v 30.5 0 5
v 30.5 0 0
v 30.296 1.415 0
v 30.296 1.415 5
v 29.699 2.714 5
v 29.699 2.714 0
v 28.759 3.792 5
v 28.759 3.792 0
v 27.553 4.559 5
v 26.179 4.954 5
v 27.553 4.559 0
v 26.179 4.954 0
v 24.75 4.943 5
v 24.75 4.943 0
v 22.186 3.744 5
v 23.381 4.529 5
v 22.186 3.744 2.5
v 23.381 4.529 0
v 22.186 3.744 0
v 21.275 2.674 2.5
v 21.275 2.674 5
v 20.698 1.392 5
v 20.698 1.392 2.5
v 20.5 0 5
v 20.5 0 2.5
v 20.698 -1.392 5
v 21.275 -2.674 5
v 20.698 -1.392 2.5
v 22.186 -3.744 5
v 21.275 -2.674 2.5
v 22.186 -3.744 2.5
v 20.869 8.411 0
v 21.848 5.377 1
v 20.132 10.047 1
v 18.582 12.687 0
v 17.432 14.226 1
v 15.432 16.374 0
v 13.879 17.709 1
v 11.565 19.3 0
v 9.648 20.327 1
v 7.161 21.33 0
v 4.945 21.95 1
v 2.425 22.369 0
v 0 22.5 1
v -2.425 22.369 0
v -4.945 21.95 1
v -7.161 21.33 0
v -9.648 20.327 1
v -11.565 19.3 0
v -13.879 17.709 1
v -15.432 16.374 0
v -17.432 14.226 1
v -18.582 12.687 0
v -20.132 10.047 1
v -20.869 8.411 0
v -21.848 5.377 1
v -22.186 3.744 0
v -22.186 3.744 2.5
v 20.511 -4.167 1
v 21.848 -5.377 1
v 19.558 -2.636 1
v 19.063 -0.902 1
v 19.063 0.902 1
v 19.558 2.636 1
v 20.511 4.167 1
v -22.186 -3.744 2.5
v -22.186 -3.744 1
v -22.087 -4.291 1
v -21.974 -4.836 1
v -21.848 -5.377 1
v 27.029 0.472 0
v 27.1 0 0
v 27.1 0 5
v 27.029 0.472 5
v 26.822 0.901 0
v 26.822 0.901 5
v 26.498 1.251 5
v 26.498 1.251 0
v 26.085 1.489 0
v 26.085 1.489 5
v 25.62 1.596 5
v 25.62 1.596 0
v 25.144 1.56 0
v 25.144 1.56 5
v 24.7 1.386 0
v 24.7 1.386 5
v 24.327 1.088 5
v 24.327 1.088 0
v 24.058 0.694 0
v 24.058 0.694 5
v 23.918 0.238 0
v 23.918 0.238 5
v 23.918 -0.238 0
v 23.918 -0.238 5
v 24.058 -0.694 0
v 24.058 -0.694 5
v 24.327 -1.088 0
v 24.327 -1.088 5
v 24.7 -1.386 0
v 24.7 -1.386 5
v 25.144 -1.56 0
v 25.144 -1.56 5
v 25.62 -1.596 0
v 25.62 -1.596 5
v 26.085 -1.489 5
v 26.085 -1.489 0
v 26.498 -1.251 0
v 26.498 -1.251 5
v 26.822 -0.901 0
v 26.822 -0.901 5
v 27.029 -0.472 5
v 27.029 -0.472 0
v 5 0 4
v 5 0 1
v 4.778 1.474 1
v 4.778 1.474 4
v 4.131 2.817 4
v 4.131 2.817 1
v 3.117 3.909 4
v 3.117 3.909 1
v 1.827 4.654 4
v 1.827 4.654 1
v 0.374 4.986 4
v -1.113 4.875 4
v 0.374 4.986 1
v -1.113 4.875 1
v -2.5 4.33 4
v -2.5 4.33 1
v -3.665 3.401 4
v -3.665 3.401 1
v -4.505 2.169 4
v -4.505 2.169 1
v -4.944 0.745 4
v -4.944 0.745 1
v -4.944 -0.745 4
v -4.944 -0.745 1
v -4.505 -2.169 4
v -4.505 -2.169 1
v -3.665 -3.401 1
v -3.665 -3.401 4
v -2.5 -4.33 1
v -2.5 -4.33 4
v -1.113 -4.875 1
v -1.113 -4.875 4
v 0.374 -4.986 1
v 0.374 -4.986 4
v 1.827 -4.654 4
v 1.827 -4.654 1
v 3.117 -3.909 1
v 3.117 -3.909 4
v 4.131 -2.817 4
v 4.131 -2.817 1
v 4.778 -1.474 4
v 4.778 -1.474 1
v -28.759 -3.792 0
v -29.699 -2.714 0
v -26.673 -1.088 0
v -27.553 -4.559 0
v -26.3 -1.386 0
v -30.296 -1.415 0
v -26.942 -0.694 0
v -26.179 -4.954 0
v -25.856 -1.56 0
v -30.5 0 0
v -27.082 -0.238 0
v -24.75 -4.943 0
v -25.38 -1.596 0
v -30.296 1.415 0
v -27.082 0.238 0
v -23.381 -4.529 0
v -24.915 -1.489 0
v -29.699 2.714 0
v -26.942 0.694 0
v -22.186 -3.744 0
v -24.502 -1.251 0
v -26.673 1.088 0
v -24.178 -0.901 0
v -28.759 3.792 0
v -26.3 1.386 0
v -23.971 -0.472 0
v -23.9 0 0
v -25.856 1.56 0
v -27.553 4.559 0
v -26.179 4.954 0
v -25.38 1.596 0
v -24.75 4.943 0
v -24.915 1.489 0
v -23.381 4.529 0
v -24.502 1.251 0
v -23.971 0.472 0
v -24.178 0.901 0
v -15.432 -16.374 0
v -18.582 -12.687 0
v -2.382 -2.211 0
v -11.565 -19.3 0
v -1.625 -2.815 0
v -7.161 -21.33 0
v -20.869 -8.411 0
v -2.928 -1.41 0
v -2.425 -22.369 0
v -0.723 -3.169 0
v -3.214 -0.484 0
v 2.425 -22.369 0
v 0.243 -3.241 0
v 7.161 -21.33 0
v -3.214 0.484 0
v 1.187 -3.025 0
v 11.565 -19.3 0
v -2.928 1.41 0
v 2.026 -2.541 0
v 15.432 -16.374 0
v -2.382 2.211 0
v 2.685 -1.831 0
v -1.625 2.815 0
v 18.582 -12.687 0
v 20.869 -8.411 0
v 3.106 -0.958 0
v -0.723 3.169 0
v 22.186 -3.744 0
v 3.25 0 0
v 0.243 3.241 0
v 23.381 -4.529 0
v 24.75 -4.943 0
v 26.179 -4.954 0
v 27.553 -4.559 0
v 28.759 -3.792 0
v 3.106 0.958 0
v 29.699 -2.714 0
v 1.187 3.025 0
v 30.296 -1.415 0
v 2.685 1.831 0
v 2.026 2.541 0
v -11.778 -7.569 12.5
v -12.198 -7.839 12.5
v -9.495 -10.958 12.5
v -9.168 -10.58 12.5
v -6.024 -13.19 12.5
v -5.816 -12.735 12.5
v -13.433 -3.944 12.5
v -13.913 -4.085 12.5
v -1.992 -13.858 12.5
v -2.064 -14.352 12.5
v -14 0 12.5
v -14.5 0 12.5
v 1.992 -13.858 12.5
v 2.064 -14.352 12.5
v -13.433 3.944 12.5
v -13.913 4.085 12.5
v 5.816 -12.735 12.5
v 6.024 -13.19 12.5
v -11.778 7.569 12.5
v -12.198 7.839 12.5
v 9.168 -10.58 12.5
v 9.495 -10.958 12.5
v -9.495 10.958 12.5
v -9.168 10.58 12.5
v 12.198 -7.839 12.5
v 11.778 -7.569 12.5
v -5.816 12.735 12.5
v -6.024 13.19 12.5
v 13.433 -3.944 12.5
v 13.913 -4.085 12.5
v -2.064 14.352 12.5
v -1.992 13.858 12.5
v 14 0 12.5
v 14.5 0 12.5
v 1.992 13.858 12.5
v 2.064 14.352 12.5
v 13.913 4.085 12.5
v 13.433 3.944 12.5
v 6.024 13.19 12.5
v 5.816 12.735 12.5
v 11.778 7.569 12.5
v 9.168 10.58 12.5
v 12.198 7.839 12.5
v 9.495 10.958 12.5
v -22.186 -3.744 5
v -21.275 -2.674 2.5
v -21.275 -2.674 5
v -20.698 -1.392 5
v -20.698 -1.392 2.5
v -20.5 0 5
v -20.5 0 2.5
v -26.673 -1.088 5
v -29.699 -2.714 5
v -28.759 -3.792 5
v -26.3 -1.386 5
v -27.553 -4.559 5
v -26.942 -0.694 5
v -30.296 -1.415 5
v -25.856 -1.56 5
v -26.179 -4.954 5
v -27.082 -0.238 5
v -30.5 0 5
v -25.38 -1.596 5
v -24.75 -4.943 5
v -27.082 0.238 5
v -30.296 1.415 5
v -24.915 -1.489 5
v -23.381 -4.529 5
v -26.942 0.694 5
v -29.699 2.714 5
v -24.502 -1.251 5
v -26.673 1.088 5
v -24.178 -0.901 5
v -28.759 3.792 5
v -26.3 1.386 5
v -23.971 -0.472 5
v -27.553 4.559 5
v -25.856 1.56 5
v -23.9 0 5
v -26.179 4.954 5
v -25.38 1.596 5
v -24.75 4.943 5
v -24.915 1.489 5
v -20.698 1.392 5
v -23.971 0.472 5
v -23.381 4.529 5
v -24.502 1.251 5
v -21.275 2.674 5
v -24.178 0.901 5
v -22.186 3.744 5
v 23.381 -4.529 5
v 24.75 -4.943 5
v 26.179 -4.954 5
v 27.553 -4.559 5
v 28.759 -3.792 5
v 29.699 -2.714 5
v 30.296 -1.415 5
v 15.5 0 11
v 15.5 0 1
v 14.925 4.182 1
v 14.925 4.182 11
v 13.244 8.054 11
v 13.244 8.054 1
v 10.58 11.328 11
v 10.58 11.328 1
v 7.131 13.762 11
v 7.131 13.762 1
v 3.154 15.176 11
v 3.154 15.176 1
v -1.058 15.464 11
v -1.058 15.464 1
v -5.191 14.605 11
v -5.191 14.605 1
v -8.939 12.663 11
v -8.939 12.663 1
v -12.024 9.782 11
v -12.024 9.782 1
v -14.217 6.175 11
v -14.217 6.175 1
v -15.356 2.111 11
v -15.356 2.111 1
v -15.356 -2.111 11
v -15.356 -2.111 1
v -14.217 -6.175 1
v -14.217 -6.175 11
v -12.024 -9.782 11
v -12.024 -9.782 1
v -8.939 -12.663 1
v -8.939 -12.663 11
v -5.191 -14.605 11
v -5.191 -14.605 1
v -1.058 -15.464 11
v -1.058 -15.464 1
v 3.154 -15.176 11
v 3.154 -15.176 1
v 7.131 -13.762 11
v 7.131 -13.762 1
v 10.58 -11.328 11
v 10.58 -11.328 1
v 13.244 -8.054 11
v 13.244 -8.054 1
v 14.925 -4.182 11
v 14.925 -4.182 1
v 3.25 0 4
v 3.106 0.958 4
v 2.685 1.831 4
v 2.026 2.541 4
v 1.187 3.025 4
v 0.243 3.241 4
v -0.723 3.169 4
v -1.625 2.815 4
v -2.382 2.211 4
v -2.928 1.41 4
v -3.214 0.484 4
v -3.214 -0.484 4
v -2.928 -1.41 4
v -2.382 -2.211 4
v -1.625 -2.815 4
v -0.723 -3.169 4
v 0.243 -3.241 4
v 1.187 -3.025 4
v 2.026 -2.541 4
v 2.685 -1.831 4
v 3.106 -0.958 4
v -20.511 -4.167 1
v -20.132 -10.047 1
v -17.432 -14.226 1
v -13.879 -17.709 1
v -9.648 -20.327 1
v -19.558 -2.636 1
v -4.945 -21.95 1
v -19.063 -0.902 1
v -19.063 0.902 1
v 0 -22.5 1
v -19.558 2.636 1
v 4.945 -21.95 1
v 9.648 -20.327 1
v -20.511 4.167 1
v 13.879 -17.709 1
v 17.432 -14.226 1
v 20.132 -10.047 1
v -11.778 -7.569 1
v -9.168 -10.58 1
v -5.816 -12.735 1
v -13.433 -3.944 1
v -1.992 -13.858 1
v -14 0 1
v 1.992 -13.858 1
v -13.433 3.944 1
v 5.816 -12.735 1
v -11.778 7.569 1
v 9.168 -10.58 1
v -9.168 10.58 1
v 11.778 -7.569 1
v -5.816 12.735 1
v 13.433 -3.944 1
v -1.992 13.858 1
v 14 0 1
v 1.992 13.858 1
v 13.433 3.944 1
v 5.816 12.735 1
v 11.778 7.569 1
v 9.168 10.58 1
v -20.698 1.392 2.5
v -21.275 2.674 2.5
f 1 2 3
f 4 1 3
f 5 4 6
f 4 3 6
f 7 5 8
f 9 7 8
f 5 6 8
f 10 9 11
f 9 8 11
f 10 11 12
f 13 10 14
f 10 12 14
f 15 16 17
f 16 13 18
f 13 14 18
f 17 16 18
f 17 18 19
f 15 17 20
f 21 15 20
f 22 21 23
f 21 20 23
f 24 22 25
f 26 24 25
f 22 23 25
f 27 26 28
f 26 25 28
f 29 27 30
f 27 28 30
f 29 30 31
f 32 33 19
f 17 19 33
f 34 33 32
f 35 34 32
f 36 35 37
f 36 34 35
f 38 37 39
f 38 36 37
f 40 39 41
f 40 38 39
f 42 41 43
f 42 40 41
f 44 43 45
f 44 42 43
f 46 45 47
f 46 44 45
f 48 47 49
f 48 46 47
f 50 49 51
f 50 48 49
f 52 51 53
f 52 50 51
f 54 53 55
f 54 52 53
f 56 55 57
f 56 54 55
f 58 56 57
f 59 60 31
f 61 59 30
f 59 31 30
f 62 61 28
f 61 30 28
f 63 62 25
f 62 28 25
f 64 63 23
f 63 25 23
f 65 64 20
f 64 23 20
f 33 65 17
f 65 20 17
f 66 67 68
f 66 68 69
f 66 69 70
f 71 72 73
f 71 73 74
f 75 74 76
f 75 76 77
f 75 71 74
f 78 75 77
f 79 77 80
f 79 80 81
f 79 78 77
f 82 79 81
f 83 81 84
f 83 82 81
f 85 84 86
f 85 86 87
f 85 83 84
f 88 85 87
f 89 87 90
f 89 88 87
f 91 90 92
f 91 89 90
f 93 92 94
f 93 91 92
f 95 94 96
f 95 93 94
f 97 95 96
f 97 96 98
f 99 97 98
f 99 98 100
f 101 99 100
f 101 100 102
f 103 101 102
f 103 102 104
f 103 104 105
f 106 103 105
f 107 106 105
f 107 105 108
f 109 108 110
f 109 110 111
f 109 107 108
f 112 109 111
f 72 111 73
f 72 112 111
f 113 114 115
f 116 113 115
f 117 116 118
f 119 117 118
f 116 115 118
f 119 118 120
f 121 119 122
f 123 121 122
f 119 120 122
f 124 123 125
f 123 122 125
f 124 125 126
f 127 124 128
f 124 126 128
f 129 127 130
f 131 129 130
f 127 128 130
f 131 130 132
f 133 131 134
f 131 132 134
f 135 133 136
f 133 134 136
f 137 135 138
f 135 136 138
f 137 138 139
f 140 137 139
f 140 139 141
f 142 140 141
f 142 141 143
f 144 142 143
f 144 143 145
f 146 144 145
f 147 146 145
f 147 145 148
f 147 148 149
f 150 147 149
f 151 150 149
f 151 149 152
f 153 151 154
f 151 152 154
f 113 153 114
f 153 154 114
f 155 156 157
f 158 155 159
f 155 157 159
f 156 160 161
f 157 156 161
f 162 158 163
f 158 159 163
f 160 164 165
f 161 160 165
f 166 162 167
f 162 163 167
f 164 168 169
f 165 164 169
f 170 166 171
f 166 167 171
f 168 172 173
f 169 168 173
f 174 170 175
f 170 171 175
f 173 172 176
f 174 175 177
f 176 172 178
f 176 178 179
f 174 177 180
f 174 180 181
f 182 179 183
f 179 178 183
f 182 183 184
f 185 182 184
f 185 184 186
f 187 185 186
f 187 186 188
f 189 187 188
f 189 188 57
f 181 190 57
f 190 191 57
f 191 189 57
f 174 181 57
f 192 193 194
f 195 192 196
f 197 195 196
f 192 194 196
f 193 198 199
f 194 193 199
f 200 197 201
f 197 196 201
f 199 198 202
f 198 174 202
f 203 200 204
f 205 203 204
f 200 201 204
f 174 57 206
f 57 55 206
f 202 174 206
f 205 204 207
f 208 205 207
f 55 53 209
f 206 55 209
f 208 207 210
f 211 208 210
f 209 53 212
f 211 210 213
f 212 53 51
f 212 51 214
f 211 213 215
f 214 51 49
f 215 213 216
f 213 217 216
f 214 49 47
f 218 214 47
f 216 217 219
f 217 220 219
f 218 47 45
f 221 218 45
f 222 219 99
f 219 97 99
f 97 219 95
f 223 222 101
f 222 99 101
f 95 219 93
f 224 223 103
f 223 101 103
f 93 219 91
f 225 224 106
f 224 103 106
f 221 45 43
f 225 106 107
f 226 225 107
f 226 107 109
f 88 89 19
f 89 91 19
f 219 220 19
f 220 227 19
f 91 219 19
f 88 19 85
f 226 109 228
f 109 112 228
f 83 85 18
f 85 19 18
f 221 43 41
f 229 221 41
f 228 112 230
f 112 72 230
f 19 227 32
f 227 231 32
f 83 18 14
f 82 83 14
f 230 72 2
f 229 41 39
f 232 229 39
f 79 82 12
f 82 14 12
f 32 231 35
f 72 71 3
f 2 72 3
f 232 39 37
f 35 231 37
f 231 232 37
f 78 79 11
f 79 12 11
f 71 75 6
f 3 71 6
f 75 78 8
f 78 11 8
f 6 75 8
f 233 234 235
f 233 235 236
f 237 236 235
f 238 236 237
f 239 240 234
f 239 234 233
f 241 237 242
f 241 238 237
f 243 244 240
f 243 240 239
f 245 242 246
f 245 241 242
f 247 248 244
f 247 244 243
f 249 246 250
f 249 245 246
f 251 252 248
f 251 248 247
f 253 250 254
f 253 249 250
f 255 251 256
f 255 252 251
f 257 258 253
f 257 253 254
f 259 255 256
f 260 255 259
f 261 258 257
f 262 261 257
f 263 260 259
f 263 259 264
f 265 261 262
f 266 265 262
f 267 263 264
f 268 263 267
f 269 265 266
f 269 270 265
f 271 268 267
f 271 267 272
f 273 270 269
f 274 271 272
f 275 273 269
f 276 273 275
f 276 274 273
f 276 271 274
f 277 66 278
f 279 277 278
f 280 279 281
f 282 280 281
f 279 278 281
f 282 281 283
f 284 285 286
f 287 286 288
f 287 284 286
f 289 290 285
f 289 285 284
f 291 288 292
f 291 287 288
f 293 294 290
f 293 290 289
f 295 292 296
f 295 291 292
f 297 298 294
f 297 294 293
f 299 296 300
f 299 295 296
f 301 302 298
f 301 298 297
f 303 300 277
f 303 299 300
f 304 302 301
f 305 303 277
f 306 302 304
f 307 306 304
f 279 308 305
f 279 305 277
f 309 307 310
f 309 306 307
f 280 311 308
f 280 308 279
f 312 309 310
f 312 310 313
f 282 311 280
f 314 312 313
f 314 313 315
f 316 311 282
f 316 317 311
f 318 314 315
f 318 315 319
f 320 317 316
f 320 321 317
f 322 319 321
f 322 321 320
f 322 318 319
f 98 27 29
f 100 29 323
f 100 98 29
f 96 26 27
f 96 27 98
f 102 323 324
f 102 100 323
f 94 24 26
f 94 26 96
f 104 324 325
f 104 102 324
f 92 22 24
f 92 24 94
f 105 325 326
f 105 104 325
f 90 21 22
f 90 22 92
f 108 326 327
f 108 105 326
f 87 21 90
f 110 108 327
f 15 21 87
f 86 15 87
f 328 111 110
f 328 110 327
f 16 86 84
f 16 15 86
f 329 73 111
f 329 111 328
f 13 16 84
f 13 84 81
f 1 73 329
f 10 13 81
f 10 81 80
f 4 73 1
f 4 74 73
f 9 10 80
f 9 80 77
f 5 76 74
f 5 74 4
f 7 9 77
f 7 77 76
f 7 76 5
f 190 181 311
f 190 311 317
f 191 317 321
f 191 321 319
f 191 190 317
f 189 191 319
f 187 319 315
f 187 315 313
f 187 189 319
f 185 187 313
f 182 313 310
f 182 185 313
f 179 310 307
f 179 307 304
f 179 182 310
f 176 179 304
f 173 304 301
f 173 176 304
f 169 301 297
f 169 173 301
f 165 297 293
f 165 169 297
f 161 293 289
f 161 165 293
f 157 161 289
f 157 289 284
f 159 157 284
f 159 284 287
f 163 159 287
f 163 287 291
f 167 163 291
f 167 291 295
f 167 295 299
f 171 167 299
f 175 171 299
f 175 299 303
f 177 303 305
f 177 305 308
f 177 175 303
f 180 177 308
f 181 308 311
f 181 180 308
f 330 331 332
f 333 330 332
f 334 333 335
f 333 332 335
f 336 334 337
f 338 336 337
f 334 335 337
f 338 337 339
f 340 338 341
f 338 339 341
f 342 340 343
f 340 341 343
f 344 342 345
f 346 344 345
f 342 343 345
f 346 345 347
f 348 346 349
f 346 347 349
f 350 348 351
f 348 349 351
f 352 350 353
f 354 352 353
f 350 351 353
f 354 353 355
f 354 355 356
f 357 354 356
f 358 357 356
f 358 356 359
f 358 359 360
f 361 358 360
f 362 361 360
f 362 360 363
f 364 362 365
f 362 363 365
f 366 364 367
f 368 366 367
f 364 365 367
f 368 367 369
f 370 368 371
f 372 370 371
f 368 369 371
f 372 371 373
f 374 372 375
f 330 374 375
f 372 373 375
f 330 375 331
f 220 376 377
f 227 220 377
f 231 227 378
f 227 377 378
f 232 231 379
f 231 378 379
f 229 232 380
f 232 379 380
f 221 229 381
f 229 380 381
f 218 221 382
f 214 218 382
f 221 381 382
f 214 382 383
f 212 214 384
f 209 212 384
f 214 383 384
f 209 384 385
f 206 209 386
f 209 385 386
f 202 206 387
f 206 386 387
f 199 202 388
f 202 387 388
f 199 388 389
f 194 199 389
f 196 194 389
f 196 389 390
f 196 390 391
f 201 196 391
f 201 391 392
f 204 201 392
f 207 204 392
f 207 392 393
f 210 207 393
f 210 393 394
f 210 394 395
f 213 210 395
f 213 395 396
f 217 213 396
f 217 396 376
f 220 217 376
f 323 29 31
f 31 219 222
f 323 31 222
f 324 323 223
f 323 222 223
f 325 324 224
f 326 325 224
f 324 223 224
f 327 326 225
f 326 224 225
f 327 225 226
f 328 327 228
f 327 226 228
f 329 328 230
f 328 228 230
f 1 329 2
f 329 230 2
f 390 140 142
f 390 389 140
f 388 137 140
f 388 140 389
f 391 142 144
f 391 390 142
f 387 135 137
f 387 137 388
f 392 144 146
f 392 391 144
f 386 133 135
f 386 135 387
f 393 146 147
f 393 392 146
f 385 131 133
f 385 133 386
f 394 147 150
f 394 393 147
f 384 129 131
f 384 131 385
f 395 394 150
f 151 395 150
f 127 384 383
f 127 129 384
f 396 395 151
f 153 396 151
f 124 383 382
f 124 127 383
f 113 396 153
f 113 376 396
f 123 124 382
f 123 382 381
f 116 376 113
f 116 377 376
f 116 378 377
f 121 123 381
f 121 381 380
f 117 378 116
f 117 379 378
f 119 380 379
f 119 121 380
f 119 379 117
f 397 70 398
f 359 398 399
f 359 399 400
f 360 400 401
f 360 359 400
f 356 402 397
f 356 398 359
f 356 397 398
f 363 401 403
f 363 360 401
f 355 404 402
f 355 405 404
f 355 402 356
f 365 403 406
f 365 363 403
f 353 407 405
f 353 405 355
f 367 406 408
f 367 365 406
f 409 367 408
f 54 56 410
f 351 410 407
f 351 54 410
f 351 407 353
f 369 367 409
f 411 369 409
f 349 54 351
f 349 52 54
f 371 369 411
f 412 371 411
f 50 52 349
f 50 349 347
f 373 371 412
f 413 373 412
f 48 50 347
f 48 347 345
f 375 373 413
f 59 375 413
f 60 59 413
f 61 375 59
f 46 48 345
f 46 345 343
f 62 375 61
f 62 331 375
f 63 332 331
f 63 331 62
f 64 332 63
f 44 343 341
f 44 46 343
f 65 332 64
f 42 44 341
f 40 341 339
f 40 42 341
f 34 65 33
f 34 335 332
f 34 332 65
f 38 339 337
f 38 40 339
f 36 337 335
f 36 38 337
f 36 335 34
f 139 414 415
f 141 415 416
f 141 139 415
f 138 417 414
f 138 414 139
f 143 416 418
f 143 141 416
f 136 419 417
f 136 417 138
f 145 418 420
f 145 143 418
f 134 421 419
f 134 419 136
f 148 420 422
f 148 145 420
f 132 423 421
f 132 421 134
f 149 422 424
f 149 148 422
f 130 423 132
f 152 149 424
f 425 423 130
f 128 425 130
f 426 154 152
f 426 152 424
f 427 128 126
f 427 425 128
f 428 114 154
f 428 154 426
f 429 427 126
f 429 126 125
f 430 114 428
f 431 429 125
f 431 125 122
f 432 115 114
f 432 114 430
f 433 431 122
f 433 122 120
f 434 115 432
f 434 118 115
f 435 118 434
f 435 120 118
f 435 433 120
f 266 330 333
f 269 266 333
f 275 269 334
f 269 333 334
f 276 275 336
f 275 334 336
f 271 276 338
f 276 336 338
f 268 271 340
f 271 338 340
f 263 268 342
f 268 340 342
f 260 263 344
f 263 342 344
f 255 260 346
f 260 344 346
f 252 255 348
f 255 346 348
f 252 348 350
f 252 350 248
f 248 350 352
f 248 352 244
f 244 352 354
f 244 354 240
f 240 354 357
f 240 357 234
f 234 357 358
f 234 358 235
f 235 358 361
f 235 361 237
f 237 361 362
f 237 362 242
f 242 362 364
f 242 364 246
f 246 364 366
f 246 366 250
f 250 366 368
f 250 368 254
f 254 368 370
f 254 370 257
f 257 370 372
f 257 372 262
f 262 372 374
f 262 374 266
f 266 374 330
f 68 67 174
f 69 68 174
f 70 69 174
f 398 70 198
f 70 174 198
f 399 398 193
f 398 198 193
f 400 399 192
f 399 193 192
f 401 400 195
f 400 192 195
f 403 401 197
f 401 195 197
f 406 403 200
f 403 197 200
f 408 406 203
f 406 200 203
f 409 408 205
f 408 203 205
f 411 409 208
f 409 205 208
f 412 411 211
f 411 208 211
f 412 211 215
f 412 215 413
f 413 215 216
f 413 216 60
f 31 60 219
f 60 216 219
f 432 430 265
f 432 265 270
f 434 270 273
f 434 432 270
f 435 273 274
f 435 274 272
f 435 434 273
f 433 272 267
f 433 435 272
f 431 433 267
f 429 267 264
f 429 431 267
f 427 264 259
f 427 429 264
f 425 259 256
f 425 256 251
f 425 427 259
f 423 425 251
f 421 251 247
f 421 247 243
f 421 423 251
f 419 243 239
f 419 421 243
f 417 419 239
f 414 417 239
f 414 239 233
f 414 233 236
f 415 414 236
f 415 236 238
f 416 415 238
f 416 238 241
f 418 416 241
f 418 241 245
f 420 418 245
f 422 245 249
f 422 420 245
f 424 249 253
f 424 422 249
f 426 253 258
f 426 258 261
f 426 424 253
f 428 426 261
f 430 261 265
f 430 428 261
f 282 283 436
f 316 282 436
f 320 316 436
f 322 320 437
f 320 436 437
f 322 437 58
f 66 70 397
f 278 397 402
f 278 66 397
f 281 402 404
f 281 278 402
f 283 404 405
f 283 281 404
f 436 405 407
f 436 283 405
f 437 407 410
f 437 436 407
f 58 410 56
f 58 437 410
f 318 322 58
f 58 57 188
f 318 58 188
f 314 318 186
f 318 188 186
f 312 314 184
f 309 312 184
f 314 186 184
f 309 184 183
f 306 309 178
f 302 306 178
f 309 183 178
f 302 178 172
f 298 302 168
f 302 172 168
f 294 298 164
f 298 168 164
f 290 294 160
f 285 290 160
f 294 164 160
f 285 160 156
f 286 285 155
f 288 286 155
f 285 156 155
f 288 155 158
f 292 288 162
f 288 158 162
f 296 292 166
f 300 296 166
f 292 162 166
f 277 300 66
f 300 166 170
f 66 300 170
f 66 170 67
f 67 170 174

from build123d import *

# Parameters (mm, degrees)
F0_R         = 1.6
F1_DEPTH     = 5
F2_DEPTH     = 1
F3_R         = 15.5
F3_R_2       = 14
F4_DEPTH     = 11.5
F5_SIZE2     = 1.5
F5_SIZE      = 1
F8_T4_ANGLE  = 185.4300536725
F8_S5_R      = 22.5
F8_T6_DEPTH  = 9
F8_T10_ANGLE = 185.4300536725
F8_S11_R     = 22.5
F8_T12_DEPTH = 9
F9_R         = 5
F10_DEPTH    = 3
F11_R        = 3.25
F12_DEPTH    = 5


# Not quite as in the source:
# - a fillet or chamfer that OpenCascade refuses, or shapes differently, is made with other operations: its cross-section is extruded or revolved along the edge and cut away or added
# - a feature of the source that left no trace in its solid (it failed there, or was rolled back) is left out


with BuildPart() as f1:
    # F0 (on Top) → F1 (new body)
    with BuildSketch(Plane.XY):
        with BuildLine():
            ThreePointArc((-22.1862745098, -3.7442253372), (-22.5, 0), (-22.1862745098, 3.7442253372))
            ThreePointArc((-22.1862745098, 3.7442253372), (-30.5, 0), (-22.1862745098, -3.7442253372))
        make_face()
        with Locations((-25.5, 0)):
            Circle(F0_R, mode=Mode.SUBTRACT)
        with BuildLine():
            ThreePointArc((-20.5, 0), (-20.9410183456, 2.0532136456), (-22.1862745098, 3.7442253372))
            ThreePointArc((-22.1862745098, 3.7442253372), (-22.5, 0), (-22.1862745098, -3.7442253372))
            ThreePointArc((-22.1862745098, -3.7442253372), (-20.9410183456, -2.0532136456), (-20.5, 0))
        make_face()
    extrude(amount=F1_DEPTH)



with BuildPart() as f1b:
    # F0 (on Top) → F1, piece 2 (new body)
    with BuildSketch(Plane.XY):
        with BuildLine():
            ThreePointArc((22.1862745098, 3.7442253372), (22.4214314493, 1.8786728733), (22.5, 0))
            ThreePointArc((22.5, 0), (22.4214314493, -1.8786728733), (22.1862745098, -3.7442253372))
            ThreePointArc((22.1862745098, -3.7442253372), (27.5532136456, -4.5589816544), (30.5, 0))
            ThreePointArc((30.5, 0), (27.5532136456, 4.5589816544), (22.1862745098, 3.7442253372))
        make_face()
        with Locations((25.5, 0)):
            Circle(F0_R, mode=Mode.SUBTRACT)
        with BuildLine():
            ThreePointArc((22.1862745098, -3.7442253372), (22.4214314493, -1.8786728733), (22.5, 0))
            ThreePointArc((22.5, 0), (22.4214314493, 1.8786728733), (22.1862745098, 3.7442253372))
            ThreePointArc((22.1862745098, 3.7442253372), (20.5, 0), (22.1862745098, -3.7442253372))
        make_face()
    extrude(amount=F1_DEPTH)


with BuildPart() as f1_1:
    add(f1.part)

    add(f1b.part)  # F2 merges F1b
    # F0 (on Top) → F2 (join)
    with BuildSketch(Plane.XY):
        with BuildLine():
            ThreePointArc((22.1862745098, -3.7442253372), (20.5, 0), (22.1862745098, 3.7442253372))
            ThreePointArc((22.1862745098, 3.7442253372), (0, 22.5), (-22.1862745098, 3.7442253372))
            ThreePointArc((-22.1862745098, 3.7442253372), (-20.9410183456, 2.0532136456), (-20.5, 0))
            ThreePointArc((-20.5, 0), (-20.9410183456, -2.0532136456), (-22.1862745098, -3.7442253372))
            ThreePointArc((-22.1862745098, -3.7442253372), (0, -22.5), (22.1862745098, -3.7442253372))
        make_face()
    extrude(amount=F2_DEPTH)

    # F3 (on face) → F4 (join)
    with BuildSketch(Plane.XY.offset(1)):
        Circle(F3_R)
        Circle(F3_R_2, mode=Mode.SUBTRACT)
    extrude(amount=F4_DEPTH)

    # F5
    f5_edges = [f1_1.edges().sort_by_distance(p)[0] for p in [
        (-15.5, 0, 12.5),
    ]]
    f5_side = f1_1.faces().sort_by_distance((-15.061594, 0, 12.5))[0]
    chamfer(f5_edges, length=F5_SIZE, length2=F5_SIZE2, reference=f5_side)

    # F8: chamfer of 1.5 on 2 edges, made by hand


with BuildPart() as f8_tool2:
    # F8_s3 → F8_t4 (revolve)
    with BuildSketch(Plane(origin=(25.4427839223, 1.2065389767, 0), x_dir=(0, 0, 1), z_dir=(0.9988774861, 0.0473684257, 0))):
        Polygon((1, 7.7078948555), (2.5, 6.2078948555), (1, 6.2078948555), align=None)
    revolve(axis=Axis((25.5, 0, 1), (0, 0, -1)), revolution_arc=F8_T4_ANGLE)

    # F8_s5 → F8_t6 (intersect, symmetric)
    with BuildSketch(Plane.XY.offset(1.8)):
        Circle(F8_S5_R)
    extrude(amount=F8_T6_DEPTH, both=True, mode=Mode.INTERSECT)


with BuildPart() as f1_2:
    add(f1_1.part)

    # F8_t1: union F8_tool2
    add(f8_tool2.part)


with BuildPart() as f8_tool8:
    # F8_s9 → F8_t10 (revolve)
    with BuildSketch(Plane(origin=(-25.4427839223, 1.2065389767, 0), x_dir=(0, 0, 1), z_dir=(-0.9988774861, 0.0473684257, 0))):
        Polygon((1, -7.7078948555), (2.5, -6.2078948555), (1, -6.2078948555), align=None)
    revolve(axis=Axis((-25.5, 0, 1), (0, 0, 1)), revolution_arc=F8_T10_ANGLE)

    # F8_s11 → F8_t12 (intersect, symmetric)
    with BuildSketch(Plane.XY.offset(1.7)):
        Circle(F8_S11_R)
    extrude(amount=F8_T12_DEPTH, both=True, mode=Mode.INTERSECT)


with BuildPart() as f1_3:
    add(f1_2.part)

    # F8_t7: union F8_tool8
    add(f8_tool8.part)

    # F9 (on face) → F10 (join)
    with BuildSketch(Plane.XY.offset(1)):
        Circle(F9_R)
    extrude(amount=F10_DEPTH)

    # F11 (on face) → F12 (cut)
    with BuildSketch(Plane.XY.offset(4)):
        Circle(F11_R)
    extrude(amount=-F12_DEPTH, mode=Mode.SUBTRACT)


solid = f1_3.part
